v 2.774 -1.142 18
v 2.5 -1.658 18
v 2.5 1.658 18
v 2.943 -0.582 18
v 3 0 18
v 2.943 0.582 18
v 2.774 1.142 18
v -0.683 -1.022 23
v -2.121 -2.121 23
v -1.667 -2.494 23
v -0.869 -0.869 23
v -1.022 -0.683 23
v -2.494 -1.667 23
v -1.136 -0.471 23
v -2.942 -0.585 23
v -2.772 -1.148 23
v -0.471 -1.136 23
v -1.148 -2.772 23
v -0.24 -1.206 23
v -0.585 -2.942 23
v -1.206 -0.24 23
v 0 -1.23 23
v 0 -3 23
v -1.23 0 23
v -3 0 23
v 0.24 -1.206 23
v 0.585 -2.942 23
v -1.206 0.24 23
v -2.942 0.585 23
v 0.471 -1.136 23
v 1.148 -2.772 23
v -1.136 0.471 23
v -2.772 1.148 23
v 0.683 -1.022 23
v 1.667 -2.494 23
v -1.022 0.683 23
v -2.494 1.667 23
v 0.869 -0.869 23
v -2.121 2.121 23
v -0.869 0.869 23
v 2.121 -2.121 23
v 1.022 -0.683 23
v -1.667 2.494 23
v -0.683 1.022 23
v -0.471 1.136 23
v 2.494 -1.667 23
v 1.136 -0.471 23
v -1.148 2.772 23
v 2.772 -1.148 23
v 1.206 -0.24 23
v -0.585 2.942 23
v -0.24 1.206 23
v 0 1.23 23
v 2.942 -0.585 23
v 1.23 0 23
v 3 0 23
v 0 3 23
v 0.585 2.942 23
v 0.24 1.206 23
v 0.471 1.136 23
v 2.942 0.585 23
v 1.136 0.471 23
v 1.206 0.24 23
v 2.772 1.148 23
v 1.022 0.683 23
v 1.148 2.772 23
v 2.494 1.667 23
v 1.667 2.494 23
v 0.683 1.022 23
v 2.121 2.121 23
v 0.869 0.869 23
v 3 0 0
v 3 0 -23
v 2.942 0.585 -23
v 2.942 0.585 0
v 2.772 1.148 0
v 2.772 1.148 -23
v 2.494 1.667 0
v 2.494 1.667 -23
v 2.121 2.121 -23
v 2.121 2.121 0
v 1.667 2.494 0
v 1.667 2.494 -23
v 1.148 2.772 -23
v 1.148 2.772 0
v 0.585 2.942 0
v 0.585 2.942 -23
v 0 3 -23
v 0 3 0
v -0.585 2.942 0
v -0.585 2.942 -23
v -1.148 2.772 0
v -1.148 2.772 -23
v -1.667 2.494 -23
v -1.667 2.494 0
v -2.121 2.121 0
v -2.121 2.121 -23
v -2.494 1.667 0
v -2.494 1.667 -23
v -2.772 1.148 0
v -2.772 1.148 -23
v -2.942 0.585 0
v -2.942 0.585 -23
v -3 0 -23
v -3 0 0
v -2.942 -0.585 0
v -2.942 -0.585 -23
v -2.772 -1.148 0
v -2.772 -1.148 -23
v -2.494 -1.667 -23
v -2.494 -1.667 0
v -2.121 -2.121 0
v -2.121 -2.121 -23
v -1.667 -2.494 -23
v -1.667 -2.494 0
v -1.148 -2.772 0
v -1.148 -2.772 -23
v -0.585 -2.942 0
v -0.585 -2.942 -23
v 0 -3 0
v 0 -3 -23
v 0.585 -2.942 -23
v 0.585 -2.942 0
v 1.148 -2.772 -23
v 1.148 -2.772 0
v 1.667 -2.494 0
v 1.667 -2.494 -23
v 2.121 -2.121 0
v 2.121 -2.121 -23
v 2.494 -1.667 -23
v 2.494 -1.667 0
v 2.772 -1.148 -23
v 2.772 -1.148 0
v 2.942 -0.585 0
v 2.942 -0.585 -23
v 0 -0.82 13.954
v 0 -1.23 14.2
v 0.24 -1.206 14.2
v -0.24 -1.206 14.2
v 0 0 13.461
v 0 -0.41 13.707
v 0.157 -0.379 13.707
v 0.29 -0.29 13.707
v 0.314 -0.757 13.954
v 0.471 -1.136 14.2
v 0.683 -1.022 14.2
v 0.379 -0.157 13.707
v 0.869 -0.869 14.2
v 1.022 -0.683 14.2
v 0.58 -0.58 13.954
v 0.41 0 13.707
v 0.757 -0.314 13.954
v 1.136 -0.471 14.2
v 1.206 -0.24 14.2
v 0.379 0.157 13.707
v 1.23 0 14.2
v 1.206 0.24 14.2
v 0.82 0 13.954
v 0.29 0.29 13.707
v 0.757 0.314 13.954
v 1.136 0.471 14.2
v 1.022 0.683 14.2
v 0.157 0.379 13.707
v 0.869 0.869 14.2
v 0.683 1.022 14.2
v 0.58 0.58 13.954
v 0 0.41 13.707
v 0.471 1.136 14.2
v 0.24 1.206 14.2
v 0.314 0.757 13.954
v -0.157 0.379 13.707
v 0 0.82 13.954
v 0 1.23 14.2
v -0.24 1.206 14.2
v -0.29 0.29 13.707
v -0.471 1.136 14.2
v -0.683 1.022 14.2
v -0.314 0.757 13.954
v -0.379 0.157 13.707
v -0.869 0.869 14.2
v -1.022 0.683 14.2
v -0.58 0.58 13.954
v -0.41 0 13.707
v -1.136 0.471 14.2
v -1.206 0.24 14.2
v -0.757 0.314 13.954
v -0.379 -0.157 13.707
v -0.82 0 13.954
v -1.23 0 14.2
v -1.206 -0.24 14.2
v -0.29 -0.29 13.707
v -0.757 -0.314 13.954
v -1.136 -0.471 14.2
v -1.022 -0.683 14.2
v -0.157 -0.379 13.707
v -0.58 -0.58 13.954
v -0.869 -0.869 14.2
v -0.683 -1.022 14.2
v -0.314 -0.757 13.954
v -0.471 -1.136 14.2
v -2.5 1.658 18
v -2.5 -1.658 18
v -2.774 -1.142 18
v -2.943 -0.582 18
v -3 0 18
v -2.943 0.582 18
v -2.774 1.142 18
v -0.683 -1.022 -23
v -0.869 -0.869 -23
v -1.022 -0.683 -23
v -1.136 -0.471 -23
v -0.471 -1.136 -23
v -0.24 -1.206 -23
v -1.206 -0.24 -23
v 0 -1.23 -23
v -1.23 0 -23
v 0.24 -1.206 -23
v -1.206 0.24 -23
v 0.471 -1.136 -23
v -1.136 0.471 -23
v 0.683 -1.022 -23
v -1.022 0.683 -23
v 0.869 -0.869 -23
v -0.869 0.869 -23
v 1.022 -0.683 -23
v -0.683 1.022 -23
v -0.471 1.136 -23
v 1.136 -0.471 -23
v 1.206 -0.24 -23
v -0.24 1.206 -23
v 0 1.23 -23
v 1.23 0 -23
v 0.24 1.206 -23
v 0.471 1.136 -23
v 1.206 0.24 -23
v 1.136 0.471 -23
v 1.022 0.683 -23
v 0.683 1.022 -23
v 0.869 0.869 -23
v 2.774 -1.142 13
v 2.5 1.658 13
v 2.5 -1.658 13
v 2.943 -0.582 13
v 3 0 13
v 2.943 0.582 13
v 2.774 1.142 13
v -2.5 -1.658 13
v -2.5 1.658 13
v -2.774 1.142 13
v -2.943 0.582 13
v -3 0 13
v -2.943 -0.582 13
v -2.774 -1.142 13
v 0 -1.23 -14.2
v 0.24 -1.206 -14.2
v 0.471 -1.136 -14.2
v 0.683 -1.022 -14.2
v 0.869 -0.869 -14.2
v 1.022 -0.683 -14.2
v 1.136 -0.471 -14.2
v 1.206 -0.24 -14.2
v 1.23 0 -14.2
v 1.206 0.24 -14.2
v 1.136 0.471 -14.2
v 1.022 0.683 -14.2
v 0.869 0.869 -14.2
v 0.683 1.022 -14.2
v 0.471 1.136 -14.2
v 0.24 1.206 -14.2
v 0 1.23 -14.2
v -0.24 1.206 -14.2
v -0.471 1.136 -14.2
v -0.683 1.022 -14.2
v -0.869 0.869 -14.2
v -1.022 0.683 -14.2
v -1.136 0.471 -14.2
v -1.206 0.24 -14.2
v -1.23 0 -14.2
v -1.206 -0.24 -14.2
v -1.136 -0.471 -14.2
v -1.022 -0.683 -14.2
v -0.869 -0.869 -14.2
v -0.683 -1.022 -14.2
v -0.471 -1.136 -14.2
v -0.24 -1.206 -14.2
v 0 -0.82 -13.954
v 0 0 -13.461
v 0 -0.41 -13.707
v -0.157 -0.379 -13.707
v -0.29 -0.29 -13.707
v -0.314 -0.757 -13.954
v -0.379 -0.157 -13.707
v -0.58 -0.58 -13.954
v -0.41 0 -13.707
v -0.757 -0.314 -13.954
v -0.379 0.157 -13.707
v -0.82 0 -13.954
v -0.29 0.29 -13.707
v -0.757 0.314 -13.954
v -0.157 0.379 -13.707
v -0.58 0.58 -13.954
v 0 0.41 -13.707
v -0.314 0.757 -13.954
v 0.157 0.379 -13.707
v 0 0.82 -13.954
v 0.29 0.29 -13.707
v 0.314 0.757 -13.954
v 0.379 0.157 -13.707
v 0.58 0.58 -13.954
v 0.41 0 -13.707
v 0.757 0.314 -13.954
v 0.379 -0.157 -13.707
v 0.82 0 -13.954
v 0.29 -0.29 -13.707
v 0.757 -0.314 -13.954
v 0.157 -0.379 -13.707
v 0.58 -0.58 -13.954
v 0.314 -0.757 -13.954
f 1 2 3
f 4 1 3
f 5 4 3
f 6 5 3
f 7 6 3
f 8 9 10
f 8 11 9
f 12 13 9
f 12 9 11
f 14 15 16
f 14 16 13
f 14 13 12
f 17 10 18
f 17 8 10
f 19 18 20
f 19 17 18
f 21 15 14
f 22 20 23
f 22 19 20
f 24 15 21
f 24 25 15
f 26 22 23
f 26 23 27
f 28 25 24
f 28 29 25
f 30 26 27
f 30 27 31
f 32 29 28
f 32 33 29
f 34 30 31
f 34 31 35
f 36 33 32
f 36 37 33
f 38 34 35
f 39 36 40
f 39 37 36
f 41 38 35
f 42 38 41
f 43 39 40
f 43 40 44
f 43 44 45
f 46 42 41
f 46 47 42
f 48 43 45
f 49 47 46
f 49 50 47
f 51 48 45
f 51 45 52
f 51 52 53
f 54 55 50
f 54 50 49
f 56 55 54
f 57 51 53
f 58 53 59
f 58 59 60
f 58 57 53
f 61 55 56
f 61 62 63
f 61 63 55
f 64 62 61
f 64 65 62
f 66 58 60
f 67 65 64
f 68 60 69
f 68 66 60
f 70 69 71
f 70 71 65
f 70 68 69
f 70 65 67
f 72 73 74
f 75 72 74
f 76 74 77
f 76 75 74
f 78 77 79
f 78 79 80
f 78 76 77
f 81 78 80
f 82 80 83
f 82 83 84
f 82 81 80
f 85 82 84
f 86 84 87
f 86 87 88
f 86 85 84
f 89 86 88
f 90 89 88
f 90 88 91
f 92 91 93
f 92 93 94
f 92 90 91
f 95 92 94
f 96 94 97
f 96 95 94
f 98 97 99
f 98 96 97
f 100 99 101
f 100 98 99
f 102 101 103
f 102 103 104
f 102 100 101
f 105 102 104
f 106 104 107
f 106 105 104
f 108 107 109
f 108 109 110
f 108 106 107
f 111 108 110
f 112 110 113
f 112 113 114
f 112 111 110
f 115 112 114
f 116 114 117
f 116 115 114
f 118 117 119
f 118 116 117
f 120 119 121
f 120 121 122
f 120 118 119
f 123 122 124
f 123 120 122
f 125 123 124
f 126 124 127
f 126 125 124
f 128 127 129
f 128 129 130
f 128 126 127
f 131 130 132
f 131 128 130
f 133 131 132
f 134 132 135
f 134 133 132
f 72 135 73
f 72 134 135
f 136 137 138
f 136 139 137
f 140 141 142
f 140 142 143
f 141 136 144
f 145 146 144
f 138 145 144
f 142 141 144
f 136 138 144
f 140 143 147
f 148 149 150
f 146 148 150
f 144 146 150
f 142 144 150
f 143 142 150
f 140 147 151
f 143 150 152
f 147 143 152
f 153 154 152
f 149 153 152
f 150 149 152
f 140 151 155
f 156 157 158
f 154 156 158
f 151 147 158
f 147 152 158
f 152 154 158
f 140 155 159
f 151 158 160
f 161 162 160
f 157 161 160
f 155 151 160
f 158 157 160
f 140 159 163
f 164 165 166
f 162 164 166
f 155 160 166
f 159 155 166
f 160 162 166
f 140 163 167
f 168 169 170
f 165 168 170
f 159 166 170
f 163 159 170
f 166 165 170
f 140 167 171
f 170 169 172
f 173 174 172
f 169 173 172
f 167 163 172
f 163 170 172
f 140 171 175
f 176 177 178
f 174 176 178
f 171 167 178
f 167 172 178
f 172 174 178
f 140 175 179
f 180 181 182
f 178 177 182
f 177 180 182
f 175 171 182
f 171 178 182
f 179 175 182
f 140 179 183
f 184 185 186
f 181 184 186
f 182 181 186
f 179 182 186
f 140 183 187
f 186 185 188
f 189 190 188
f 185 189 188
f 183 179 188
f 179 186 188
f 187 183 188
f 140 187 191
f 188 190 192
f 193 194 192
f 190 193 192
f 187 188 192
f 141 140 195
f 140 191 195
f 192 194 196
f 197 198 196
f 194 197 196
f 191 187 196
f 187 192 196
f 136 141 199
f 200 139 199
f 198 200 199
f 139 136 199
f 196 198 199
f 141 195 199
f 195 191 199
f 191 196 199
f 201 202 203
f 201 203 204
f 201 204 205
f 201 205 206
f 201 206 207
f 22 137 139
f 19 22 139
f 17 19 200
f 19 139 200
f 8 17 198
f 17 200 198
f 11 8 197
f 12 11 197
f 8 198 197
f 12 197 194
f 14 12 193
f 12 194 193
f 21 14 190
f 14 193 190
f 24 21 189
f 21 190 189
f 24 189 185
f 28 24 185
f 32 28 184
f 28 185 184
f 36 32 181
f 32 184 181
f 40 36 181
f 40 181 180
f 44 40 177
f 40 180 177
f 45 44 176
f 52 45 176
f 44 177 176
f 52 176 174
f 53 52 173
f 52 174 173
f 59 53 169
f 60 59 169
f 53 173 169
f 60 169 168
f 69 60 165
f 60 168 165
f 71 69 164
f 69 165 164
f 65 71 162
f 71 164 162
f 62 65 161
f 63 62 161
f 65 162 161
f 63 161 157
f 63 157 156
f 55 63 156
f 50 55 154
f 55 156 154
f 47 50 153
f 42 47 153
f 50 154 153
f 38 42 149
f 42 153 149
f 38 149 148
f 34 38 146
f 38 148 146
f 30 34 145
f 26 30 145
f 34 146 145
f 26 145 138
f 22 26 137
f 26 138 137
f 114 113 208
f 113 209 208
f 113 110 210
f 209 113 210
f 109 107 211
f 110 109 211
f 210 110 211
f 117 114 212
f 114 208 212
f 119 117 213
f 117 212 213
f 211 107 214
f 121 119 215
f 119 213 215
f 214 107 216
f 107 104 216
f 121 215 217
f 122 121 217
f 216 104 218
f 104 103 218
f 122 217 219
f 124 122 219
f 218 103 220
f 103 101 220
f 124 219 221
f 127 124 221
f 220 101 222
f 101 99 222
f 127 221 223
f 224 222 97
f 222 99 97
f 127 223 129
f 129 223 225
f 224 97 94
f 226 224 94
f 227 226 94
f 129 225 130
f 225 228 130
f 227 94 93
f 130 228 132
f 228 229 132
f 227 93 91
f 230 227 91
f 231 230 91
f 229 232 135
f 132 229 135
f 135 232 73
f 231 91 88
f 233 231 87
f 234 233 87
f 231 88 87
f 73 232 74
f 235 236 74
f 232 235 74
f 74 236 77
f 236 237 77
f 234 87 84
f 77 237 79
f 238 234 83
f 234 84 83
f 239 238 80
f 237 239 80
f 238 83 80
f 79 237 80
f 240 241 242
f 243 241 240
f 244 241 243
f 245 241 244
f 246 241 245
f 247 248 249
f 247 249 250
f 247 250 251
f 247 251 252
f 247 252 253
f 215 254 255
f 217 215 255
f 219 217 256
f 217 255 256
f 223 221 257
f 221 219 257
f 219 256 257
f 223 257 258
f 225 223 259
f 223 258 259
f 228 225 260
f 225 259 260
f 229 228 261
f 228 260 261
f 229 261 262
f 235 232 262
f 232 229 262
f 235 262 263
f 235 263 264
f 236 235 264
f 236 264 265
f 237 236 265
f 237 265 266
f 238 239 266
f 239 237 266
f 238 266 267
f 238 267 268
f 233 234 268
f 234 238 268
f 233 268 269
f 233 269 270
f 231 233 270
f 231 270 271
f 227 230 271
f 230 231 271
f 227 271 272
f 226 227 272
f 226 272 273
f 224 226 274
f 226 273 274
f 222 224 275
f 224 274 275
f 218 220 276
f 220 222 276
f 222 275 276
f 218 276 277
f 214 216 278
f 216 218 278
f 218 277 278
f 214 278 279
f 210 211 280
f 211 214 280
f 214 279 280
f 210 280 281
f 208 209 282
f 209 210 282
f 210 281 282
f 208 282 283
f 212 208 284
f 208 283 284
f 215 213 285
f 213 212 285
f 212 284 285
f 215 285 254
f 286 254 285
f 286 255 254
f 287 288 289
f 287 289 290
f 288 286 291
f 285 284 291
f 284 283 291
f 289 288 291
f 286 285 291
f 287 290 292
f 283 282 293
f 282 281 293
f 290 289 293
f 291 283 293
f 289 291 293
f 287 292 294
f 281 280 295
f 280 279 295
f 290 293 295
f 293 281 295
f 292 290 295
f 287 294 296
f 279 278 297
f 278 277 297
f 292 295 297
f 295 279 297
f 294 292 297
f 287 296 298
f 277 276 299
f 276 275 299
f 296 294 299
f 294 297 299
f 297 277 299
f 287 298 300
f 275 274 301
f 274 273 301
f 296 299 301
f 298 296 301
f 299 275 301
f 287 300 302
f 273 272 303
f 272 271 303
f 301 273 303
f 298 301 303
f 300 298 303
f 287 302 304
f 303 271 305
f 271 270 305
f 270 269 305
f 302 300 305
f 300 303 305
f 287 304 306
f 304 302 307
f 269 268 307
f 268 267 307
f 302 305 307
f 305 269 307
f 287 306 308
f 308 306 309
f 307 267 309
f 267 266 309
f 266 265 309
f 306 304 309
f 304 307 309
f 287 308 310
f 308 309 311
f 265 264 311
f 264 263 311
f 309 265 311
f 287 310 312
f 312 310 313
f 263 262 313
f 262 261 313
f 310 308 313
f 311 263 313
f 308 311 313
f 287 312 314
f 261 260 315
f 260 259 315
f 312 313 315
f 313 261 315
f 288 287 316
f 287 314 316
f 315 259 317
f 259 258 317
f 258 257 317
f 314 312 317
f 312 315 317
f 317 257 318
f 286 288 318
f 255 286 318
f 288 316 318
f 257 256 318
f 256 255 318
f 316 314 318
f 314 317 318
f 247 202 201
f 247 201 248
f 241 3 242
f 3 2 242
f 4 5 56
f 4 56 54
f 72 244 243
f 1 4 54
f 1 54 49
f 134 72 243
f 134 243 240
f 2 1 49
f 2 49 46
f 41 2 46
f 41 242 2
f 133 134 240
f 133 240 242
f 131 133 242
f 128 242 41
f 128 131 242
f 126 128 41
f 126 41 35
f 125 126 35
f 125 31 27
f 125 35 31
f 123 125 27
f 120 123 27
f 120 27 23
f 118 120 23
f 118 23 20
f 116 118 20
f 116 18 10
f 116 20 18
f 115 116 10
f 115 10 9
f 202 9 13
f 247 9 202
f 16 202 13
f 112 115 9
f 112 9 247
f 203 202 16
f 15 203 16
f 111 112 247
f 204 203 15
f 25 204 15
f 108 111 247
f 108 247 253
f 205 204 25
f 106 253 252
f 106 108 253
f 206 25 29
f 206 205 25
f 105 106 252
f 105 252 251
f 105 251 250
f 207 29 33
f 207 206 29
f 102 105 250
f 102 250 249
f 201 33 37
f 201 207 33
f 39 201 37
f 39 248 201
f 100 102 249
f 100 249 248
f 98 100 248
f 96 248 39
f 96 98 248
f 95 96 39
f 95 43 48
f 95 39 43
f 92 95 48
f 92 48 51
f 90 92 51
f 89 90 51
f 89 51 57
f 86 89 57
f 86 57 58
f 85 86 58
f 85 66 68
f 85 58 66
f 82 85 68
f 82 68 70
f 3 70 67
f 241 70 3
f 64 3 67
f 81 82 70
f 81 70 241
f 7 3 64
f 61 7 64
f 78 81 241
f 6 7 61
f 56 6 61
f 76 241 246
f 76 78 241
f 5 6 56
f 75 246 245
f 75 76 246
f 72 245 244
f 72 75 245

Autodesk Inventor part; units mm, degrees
ref_plane "YZ Plane" through (0, 0, 0) normal (1, 0, 0) x (0, 1, 0)
ref_plane "XZ Plane" through (0, 0, 0) normal (0, 1, 0) x (-1, 0, 0)
ref_plane "XY Plane" through (0, 0, 0) normal (0, 0, 1) x (1, 0, 0)
sketch "Sketch1" plane through (0, 0, 0) normal (0, 0, 1) x (1, 0, 0)
  circle A0 centre (0, 0) radius 3
  dimension "d0" = 6
extrude "Extrusion1" add sketch "Sketch1" along normal mid plane 46
sketch "Sketch2" plane through (0, 0, 23) normal (0, 0, 1) x (1, 0, 0)
  point P0 (0, 0)
  point P1 (0, 0)
hole "Hole1" at (0, 0, 23) direction (0, 0, -1) diameter 2.459 depth 8.8 tip angle 118 thread size "M3x0.5" class "6H" standard "ANSI Metric M Profile"
sketch "Sketch3" plane through (0, 0, 0) normal (0, 1, 0) x (-1, 0, 0)
  line L0 (3, -23) -> (3, 23) projected
  line L1 (3, 18) -> (2.5, 18)
  line L2 (2.5, 18) -> (2.5, 13)
  line L3 (2.5, 13) -> (3, 13)
  line L4 (3, 13) -> (3, 18)
  line L5 (-3, 18) -> (-2.5, 18)
  line L6 (-2.5, 18) -> (-2.5, 13)
  line L7 (-2.5, 13) -> (-3, 13)
  line L8 (-3, 13) -> (-3, 18)
  line L9 (3, 23) -> (-3, 23) projected
  point P0 (0, 0)
  dimension "d10" = 0.5
  dimension "d11" = 5
  dimension "d12" = 0.5
  dimension "d16" = 5
  dimension "d19" = 5
  dimension "d20" = 6
  dimension "d21" = 6
extrude "Extrusion2" cut sketch "Sketch3" along normal through all both and the other way through all
mirror "Mirror1" about plane through (0, 0, 0) normal (0, 0, 1) of "Hole1"
equation "\"d10\" = d12"
equation "\"d20\" = d21"
properties part number "Top_Separator Weight 2" material "Aluminum 6061"
